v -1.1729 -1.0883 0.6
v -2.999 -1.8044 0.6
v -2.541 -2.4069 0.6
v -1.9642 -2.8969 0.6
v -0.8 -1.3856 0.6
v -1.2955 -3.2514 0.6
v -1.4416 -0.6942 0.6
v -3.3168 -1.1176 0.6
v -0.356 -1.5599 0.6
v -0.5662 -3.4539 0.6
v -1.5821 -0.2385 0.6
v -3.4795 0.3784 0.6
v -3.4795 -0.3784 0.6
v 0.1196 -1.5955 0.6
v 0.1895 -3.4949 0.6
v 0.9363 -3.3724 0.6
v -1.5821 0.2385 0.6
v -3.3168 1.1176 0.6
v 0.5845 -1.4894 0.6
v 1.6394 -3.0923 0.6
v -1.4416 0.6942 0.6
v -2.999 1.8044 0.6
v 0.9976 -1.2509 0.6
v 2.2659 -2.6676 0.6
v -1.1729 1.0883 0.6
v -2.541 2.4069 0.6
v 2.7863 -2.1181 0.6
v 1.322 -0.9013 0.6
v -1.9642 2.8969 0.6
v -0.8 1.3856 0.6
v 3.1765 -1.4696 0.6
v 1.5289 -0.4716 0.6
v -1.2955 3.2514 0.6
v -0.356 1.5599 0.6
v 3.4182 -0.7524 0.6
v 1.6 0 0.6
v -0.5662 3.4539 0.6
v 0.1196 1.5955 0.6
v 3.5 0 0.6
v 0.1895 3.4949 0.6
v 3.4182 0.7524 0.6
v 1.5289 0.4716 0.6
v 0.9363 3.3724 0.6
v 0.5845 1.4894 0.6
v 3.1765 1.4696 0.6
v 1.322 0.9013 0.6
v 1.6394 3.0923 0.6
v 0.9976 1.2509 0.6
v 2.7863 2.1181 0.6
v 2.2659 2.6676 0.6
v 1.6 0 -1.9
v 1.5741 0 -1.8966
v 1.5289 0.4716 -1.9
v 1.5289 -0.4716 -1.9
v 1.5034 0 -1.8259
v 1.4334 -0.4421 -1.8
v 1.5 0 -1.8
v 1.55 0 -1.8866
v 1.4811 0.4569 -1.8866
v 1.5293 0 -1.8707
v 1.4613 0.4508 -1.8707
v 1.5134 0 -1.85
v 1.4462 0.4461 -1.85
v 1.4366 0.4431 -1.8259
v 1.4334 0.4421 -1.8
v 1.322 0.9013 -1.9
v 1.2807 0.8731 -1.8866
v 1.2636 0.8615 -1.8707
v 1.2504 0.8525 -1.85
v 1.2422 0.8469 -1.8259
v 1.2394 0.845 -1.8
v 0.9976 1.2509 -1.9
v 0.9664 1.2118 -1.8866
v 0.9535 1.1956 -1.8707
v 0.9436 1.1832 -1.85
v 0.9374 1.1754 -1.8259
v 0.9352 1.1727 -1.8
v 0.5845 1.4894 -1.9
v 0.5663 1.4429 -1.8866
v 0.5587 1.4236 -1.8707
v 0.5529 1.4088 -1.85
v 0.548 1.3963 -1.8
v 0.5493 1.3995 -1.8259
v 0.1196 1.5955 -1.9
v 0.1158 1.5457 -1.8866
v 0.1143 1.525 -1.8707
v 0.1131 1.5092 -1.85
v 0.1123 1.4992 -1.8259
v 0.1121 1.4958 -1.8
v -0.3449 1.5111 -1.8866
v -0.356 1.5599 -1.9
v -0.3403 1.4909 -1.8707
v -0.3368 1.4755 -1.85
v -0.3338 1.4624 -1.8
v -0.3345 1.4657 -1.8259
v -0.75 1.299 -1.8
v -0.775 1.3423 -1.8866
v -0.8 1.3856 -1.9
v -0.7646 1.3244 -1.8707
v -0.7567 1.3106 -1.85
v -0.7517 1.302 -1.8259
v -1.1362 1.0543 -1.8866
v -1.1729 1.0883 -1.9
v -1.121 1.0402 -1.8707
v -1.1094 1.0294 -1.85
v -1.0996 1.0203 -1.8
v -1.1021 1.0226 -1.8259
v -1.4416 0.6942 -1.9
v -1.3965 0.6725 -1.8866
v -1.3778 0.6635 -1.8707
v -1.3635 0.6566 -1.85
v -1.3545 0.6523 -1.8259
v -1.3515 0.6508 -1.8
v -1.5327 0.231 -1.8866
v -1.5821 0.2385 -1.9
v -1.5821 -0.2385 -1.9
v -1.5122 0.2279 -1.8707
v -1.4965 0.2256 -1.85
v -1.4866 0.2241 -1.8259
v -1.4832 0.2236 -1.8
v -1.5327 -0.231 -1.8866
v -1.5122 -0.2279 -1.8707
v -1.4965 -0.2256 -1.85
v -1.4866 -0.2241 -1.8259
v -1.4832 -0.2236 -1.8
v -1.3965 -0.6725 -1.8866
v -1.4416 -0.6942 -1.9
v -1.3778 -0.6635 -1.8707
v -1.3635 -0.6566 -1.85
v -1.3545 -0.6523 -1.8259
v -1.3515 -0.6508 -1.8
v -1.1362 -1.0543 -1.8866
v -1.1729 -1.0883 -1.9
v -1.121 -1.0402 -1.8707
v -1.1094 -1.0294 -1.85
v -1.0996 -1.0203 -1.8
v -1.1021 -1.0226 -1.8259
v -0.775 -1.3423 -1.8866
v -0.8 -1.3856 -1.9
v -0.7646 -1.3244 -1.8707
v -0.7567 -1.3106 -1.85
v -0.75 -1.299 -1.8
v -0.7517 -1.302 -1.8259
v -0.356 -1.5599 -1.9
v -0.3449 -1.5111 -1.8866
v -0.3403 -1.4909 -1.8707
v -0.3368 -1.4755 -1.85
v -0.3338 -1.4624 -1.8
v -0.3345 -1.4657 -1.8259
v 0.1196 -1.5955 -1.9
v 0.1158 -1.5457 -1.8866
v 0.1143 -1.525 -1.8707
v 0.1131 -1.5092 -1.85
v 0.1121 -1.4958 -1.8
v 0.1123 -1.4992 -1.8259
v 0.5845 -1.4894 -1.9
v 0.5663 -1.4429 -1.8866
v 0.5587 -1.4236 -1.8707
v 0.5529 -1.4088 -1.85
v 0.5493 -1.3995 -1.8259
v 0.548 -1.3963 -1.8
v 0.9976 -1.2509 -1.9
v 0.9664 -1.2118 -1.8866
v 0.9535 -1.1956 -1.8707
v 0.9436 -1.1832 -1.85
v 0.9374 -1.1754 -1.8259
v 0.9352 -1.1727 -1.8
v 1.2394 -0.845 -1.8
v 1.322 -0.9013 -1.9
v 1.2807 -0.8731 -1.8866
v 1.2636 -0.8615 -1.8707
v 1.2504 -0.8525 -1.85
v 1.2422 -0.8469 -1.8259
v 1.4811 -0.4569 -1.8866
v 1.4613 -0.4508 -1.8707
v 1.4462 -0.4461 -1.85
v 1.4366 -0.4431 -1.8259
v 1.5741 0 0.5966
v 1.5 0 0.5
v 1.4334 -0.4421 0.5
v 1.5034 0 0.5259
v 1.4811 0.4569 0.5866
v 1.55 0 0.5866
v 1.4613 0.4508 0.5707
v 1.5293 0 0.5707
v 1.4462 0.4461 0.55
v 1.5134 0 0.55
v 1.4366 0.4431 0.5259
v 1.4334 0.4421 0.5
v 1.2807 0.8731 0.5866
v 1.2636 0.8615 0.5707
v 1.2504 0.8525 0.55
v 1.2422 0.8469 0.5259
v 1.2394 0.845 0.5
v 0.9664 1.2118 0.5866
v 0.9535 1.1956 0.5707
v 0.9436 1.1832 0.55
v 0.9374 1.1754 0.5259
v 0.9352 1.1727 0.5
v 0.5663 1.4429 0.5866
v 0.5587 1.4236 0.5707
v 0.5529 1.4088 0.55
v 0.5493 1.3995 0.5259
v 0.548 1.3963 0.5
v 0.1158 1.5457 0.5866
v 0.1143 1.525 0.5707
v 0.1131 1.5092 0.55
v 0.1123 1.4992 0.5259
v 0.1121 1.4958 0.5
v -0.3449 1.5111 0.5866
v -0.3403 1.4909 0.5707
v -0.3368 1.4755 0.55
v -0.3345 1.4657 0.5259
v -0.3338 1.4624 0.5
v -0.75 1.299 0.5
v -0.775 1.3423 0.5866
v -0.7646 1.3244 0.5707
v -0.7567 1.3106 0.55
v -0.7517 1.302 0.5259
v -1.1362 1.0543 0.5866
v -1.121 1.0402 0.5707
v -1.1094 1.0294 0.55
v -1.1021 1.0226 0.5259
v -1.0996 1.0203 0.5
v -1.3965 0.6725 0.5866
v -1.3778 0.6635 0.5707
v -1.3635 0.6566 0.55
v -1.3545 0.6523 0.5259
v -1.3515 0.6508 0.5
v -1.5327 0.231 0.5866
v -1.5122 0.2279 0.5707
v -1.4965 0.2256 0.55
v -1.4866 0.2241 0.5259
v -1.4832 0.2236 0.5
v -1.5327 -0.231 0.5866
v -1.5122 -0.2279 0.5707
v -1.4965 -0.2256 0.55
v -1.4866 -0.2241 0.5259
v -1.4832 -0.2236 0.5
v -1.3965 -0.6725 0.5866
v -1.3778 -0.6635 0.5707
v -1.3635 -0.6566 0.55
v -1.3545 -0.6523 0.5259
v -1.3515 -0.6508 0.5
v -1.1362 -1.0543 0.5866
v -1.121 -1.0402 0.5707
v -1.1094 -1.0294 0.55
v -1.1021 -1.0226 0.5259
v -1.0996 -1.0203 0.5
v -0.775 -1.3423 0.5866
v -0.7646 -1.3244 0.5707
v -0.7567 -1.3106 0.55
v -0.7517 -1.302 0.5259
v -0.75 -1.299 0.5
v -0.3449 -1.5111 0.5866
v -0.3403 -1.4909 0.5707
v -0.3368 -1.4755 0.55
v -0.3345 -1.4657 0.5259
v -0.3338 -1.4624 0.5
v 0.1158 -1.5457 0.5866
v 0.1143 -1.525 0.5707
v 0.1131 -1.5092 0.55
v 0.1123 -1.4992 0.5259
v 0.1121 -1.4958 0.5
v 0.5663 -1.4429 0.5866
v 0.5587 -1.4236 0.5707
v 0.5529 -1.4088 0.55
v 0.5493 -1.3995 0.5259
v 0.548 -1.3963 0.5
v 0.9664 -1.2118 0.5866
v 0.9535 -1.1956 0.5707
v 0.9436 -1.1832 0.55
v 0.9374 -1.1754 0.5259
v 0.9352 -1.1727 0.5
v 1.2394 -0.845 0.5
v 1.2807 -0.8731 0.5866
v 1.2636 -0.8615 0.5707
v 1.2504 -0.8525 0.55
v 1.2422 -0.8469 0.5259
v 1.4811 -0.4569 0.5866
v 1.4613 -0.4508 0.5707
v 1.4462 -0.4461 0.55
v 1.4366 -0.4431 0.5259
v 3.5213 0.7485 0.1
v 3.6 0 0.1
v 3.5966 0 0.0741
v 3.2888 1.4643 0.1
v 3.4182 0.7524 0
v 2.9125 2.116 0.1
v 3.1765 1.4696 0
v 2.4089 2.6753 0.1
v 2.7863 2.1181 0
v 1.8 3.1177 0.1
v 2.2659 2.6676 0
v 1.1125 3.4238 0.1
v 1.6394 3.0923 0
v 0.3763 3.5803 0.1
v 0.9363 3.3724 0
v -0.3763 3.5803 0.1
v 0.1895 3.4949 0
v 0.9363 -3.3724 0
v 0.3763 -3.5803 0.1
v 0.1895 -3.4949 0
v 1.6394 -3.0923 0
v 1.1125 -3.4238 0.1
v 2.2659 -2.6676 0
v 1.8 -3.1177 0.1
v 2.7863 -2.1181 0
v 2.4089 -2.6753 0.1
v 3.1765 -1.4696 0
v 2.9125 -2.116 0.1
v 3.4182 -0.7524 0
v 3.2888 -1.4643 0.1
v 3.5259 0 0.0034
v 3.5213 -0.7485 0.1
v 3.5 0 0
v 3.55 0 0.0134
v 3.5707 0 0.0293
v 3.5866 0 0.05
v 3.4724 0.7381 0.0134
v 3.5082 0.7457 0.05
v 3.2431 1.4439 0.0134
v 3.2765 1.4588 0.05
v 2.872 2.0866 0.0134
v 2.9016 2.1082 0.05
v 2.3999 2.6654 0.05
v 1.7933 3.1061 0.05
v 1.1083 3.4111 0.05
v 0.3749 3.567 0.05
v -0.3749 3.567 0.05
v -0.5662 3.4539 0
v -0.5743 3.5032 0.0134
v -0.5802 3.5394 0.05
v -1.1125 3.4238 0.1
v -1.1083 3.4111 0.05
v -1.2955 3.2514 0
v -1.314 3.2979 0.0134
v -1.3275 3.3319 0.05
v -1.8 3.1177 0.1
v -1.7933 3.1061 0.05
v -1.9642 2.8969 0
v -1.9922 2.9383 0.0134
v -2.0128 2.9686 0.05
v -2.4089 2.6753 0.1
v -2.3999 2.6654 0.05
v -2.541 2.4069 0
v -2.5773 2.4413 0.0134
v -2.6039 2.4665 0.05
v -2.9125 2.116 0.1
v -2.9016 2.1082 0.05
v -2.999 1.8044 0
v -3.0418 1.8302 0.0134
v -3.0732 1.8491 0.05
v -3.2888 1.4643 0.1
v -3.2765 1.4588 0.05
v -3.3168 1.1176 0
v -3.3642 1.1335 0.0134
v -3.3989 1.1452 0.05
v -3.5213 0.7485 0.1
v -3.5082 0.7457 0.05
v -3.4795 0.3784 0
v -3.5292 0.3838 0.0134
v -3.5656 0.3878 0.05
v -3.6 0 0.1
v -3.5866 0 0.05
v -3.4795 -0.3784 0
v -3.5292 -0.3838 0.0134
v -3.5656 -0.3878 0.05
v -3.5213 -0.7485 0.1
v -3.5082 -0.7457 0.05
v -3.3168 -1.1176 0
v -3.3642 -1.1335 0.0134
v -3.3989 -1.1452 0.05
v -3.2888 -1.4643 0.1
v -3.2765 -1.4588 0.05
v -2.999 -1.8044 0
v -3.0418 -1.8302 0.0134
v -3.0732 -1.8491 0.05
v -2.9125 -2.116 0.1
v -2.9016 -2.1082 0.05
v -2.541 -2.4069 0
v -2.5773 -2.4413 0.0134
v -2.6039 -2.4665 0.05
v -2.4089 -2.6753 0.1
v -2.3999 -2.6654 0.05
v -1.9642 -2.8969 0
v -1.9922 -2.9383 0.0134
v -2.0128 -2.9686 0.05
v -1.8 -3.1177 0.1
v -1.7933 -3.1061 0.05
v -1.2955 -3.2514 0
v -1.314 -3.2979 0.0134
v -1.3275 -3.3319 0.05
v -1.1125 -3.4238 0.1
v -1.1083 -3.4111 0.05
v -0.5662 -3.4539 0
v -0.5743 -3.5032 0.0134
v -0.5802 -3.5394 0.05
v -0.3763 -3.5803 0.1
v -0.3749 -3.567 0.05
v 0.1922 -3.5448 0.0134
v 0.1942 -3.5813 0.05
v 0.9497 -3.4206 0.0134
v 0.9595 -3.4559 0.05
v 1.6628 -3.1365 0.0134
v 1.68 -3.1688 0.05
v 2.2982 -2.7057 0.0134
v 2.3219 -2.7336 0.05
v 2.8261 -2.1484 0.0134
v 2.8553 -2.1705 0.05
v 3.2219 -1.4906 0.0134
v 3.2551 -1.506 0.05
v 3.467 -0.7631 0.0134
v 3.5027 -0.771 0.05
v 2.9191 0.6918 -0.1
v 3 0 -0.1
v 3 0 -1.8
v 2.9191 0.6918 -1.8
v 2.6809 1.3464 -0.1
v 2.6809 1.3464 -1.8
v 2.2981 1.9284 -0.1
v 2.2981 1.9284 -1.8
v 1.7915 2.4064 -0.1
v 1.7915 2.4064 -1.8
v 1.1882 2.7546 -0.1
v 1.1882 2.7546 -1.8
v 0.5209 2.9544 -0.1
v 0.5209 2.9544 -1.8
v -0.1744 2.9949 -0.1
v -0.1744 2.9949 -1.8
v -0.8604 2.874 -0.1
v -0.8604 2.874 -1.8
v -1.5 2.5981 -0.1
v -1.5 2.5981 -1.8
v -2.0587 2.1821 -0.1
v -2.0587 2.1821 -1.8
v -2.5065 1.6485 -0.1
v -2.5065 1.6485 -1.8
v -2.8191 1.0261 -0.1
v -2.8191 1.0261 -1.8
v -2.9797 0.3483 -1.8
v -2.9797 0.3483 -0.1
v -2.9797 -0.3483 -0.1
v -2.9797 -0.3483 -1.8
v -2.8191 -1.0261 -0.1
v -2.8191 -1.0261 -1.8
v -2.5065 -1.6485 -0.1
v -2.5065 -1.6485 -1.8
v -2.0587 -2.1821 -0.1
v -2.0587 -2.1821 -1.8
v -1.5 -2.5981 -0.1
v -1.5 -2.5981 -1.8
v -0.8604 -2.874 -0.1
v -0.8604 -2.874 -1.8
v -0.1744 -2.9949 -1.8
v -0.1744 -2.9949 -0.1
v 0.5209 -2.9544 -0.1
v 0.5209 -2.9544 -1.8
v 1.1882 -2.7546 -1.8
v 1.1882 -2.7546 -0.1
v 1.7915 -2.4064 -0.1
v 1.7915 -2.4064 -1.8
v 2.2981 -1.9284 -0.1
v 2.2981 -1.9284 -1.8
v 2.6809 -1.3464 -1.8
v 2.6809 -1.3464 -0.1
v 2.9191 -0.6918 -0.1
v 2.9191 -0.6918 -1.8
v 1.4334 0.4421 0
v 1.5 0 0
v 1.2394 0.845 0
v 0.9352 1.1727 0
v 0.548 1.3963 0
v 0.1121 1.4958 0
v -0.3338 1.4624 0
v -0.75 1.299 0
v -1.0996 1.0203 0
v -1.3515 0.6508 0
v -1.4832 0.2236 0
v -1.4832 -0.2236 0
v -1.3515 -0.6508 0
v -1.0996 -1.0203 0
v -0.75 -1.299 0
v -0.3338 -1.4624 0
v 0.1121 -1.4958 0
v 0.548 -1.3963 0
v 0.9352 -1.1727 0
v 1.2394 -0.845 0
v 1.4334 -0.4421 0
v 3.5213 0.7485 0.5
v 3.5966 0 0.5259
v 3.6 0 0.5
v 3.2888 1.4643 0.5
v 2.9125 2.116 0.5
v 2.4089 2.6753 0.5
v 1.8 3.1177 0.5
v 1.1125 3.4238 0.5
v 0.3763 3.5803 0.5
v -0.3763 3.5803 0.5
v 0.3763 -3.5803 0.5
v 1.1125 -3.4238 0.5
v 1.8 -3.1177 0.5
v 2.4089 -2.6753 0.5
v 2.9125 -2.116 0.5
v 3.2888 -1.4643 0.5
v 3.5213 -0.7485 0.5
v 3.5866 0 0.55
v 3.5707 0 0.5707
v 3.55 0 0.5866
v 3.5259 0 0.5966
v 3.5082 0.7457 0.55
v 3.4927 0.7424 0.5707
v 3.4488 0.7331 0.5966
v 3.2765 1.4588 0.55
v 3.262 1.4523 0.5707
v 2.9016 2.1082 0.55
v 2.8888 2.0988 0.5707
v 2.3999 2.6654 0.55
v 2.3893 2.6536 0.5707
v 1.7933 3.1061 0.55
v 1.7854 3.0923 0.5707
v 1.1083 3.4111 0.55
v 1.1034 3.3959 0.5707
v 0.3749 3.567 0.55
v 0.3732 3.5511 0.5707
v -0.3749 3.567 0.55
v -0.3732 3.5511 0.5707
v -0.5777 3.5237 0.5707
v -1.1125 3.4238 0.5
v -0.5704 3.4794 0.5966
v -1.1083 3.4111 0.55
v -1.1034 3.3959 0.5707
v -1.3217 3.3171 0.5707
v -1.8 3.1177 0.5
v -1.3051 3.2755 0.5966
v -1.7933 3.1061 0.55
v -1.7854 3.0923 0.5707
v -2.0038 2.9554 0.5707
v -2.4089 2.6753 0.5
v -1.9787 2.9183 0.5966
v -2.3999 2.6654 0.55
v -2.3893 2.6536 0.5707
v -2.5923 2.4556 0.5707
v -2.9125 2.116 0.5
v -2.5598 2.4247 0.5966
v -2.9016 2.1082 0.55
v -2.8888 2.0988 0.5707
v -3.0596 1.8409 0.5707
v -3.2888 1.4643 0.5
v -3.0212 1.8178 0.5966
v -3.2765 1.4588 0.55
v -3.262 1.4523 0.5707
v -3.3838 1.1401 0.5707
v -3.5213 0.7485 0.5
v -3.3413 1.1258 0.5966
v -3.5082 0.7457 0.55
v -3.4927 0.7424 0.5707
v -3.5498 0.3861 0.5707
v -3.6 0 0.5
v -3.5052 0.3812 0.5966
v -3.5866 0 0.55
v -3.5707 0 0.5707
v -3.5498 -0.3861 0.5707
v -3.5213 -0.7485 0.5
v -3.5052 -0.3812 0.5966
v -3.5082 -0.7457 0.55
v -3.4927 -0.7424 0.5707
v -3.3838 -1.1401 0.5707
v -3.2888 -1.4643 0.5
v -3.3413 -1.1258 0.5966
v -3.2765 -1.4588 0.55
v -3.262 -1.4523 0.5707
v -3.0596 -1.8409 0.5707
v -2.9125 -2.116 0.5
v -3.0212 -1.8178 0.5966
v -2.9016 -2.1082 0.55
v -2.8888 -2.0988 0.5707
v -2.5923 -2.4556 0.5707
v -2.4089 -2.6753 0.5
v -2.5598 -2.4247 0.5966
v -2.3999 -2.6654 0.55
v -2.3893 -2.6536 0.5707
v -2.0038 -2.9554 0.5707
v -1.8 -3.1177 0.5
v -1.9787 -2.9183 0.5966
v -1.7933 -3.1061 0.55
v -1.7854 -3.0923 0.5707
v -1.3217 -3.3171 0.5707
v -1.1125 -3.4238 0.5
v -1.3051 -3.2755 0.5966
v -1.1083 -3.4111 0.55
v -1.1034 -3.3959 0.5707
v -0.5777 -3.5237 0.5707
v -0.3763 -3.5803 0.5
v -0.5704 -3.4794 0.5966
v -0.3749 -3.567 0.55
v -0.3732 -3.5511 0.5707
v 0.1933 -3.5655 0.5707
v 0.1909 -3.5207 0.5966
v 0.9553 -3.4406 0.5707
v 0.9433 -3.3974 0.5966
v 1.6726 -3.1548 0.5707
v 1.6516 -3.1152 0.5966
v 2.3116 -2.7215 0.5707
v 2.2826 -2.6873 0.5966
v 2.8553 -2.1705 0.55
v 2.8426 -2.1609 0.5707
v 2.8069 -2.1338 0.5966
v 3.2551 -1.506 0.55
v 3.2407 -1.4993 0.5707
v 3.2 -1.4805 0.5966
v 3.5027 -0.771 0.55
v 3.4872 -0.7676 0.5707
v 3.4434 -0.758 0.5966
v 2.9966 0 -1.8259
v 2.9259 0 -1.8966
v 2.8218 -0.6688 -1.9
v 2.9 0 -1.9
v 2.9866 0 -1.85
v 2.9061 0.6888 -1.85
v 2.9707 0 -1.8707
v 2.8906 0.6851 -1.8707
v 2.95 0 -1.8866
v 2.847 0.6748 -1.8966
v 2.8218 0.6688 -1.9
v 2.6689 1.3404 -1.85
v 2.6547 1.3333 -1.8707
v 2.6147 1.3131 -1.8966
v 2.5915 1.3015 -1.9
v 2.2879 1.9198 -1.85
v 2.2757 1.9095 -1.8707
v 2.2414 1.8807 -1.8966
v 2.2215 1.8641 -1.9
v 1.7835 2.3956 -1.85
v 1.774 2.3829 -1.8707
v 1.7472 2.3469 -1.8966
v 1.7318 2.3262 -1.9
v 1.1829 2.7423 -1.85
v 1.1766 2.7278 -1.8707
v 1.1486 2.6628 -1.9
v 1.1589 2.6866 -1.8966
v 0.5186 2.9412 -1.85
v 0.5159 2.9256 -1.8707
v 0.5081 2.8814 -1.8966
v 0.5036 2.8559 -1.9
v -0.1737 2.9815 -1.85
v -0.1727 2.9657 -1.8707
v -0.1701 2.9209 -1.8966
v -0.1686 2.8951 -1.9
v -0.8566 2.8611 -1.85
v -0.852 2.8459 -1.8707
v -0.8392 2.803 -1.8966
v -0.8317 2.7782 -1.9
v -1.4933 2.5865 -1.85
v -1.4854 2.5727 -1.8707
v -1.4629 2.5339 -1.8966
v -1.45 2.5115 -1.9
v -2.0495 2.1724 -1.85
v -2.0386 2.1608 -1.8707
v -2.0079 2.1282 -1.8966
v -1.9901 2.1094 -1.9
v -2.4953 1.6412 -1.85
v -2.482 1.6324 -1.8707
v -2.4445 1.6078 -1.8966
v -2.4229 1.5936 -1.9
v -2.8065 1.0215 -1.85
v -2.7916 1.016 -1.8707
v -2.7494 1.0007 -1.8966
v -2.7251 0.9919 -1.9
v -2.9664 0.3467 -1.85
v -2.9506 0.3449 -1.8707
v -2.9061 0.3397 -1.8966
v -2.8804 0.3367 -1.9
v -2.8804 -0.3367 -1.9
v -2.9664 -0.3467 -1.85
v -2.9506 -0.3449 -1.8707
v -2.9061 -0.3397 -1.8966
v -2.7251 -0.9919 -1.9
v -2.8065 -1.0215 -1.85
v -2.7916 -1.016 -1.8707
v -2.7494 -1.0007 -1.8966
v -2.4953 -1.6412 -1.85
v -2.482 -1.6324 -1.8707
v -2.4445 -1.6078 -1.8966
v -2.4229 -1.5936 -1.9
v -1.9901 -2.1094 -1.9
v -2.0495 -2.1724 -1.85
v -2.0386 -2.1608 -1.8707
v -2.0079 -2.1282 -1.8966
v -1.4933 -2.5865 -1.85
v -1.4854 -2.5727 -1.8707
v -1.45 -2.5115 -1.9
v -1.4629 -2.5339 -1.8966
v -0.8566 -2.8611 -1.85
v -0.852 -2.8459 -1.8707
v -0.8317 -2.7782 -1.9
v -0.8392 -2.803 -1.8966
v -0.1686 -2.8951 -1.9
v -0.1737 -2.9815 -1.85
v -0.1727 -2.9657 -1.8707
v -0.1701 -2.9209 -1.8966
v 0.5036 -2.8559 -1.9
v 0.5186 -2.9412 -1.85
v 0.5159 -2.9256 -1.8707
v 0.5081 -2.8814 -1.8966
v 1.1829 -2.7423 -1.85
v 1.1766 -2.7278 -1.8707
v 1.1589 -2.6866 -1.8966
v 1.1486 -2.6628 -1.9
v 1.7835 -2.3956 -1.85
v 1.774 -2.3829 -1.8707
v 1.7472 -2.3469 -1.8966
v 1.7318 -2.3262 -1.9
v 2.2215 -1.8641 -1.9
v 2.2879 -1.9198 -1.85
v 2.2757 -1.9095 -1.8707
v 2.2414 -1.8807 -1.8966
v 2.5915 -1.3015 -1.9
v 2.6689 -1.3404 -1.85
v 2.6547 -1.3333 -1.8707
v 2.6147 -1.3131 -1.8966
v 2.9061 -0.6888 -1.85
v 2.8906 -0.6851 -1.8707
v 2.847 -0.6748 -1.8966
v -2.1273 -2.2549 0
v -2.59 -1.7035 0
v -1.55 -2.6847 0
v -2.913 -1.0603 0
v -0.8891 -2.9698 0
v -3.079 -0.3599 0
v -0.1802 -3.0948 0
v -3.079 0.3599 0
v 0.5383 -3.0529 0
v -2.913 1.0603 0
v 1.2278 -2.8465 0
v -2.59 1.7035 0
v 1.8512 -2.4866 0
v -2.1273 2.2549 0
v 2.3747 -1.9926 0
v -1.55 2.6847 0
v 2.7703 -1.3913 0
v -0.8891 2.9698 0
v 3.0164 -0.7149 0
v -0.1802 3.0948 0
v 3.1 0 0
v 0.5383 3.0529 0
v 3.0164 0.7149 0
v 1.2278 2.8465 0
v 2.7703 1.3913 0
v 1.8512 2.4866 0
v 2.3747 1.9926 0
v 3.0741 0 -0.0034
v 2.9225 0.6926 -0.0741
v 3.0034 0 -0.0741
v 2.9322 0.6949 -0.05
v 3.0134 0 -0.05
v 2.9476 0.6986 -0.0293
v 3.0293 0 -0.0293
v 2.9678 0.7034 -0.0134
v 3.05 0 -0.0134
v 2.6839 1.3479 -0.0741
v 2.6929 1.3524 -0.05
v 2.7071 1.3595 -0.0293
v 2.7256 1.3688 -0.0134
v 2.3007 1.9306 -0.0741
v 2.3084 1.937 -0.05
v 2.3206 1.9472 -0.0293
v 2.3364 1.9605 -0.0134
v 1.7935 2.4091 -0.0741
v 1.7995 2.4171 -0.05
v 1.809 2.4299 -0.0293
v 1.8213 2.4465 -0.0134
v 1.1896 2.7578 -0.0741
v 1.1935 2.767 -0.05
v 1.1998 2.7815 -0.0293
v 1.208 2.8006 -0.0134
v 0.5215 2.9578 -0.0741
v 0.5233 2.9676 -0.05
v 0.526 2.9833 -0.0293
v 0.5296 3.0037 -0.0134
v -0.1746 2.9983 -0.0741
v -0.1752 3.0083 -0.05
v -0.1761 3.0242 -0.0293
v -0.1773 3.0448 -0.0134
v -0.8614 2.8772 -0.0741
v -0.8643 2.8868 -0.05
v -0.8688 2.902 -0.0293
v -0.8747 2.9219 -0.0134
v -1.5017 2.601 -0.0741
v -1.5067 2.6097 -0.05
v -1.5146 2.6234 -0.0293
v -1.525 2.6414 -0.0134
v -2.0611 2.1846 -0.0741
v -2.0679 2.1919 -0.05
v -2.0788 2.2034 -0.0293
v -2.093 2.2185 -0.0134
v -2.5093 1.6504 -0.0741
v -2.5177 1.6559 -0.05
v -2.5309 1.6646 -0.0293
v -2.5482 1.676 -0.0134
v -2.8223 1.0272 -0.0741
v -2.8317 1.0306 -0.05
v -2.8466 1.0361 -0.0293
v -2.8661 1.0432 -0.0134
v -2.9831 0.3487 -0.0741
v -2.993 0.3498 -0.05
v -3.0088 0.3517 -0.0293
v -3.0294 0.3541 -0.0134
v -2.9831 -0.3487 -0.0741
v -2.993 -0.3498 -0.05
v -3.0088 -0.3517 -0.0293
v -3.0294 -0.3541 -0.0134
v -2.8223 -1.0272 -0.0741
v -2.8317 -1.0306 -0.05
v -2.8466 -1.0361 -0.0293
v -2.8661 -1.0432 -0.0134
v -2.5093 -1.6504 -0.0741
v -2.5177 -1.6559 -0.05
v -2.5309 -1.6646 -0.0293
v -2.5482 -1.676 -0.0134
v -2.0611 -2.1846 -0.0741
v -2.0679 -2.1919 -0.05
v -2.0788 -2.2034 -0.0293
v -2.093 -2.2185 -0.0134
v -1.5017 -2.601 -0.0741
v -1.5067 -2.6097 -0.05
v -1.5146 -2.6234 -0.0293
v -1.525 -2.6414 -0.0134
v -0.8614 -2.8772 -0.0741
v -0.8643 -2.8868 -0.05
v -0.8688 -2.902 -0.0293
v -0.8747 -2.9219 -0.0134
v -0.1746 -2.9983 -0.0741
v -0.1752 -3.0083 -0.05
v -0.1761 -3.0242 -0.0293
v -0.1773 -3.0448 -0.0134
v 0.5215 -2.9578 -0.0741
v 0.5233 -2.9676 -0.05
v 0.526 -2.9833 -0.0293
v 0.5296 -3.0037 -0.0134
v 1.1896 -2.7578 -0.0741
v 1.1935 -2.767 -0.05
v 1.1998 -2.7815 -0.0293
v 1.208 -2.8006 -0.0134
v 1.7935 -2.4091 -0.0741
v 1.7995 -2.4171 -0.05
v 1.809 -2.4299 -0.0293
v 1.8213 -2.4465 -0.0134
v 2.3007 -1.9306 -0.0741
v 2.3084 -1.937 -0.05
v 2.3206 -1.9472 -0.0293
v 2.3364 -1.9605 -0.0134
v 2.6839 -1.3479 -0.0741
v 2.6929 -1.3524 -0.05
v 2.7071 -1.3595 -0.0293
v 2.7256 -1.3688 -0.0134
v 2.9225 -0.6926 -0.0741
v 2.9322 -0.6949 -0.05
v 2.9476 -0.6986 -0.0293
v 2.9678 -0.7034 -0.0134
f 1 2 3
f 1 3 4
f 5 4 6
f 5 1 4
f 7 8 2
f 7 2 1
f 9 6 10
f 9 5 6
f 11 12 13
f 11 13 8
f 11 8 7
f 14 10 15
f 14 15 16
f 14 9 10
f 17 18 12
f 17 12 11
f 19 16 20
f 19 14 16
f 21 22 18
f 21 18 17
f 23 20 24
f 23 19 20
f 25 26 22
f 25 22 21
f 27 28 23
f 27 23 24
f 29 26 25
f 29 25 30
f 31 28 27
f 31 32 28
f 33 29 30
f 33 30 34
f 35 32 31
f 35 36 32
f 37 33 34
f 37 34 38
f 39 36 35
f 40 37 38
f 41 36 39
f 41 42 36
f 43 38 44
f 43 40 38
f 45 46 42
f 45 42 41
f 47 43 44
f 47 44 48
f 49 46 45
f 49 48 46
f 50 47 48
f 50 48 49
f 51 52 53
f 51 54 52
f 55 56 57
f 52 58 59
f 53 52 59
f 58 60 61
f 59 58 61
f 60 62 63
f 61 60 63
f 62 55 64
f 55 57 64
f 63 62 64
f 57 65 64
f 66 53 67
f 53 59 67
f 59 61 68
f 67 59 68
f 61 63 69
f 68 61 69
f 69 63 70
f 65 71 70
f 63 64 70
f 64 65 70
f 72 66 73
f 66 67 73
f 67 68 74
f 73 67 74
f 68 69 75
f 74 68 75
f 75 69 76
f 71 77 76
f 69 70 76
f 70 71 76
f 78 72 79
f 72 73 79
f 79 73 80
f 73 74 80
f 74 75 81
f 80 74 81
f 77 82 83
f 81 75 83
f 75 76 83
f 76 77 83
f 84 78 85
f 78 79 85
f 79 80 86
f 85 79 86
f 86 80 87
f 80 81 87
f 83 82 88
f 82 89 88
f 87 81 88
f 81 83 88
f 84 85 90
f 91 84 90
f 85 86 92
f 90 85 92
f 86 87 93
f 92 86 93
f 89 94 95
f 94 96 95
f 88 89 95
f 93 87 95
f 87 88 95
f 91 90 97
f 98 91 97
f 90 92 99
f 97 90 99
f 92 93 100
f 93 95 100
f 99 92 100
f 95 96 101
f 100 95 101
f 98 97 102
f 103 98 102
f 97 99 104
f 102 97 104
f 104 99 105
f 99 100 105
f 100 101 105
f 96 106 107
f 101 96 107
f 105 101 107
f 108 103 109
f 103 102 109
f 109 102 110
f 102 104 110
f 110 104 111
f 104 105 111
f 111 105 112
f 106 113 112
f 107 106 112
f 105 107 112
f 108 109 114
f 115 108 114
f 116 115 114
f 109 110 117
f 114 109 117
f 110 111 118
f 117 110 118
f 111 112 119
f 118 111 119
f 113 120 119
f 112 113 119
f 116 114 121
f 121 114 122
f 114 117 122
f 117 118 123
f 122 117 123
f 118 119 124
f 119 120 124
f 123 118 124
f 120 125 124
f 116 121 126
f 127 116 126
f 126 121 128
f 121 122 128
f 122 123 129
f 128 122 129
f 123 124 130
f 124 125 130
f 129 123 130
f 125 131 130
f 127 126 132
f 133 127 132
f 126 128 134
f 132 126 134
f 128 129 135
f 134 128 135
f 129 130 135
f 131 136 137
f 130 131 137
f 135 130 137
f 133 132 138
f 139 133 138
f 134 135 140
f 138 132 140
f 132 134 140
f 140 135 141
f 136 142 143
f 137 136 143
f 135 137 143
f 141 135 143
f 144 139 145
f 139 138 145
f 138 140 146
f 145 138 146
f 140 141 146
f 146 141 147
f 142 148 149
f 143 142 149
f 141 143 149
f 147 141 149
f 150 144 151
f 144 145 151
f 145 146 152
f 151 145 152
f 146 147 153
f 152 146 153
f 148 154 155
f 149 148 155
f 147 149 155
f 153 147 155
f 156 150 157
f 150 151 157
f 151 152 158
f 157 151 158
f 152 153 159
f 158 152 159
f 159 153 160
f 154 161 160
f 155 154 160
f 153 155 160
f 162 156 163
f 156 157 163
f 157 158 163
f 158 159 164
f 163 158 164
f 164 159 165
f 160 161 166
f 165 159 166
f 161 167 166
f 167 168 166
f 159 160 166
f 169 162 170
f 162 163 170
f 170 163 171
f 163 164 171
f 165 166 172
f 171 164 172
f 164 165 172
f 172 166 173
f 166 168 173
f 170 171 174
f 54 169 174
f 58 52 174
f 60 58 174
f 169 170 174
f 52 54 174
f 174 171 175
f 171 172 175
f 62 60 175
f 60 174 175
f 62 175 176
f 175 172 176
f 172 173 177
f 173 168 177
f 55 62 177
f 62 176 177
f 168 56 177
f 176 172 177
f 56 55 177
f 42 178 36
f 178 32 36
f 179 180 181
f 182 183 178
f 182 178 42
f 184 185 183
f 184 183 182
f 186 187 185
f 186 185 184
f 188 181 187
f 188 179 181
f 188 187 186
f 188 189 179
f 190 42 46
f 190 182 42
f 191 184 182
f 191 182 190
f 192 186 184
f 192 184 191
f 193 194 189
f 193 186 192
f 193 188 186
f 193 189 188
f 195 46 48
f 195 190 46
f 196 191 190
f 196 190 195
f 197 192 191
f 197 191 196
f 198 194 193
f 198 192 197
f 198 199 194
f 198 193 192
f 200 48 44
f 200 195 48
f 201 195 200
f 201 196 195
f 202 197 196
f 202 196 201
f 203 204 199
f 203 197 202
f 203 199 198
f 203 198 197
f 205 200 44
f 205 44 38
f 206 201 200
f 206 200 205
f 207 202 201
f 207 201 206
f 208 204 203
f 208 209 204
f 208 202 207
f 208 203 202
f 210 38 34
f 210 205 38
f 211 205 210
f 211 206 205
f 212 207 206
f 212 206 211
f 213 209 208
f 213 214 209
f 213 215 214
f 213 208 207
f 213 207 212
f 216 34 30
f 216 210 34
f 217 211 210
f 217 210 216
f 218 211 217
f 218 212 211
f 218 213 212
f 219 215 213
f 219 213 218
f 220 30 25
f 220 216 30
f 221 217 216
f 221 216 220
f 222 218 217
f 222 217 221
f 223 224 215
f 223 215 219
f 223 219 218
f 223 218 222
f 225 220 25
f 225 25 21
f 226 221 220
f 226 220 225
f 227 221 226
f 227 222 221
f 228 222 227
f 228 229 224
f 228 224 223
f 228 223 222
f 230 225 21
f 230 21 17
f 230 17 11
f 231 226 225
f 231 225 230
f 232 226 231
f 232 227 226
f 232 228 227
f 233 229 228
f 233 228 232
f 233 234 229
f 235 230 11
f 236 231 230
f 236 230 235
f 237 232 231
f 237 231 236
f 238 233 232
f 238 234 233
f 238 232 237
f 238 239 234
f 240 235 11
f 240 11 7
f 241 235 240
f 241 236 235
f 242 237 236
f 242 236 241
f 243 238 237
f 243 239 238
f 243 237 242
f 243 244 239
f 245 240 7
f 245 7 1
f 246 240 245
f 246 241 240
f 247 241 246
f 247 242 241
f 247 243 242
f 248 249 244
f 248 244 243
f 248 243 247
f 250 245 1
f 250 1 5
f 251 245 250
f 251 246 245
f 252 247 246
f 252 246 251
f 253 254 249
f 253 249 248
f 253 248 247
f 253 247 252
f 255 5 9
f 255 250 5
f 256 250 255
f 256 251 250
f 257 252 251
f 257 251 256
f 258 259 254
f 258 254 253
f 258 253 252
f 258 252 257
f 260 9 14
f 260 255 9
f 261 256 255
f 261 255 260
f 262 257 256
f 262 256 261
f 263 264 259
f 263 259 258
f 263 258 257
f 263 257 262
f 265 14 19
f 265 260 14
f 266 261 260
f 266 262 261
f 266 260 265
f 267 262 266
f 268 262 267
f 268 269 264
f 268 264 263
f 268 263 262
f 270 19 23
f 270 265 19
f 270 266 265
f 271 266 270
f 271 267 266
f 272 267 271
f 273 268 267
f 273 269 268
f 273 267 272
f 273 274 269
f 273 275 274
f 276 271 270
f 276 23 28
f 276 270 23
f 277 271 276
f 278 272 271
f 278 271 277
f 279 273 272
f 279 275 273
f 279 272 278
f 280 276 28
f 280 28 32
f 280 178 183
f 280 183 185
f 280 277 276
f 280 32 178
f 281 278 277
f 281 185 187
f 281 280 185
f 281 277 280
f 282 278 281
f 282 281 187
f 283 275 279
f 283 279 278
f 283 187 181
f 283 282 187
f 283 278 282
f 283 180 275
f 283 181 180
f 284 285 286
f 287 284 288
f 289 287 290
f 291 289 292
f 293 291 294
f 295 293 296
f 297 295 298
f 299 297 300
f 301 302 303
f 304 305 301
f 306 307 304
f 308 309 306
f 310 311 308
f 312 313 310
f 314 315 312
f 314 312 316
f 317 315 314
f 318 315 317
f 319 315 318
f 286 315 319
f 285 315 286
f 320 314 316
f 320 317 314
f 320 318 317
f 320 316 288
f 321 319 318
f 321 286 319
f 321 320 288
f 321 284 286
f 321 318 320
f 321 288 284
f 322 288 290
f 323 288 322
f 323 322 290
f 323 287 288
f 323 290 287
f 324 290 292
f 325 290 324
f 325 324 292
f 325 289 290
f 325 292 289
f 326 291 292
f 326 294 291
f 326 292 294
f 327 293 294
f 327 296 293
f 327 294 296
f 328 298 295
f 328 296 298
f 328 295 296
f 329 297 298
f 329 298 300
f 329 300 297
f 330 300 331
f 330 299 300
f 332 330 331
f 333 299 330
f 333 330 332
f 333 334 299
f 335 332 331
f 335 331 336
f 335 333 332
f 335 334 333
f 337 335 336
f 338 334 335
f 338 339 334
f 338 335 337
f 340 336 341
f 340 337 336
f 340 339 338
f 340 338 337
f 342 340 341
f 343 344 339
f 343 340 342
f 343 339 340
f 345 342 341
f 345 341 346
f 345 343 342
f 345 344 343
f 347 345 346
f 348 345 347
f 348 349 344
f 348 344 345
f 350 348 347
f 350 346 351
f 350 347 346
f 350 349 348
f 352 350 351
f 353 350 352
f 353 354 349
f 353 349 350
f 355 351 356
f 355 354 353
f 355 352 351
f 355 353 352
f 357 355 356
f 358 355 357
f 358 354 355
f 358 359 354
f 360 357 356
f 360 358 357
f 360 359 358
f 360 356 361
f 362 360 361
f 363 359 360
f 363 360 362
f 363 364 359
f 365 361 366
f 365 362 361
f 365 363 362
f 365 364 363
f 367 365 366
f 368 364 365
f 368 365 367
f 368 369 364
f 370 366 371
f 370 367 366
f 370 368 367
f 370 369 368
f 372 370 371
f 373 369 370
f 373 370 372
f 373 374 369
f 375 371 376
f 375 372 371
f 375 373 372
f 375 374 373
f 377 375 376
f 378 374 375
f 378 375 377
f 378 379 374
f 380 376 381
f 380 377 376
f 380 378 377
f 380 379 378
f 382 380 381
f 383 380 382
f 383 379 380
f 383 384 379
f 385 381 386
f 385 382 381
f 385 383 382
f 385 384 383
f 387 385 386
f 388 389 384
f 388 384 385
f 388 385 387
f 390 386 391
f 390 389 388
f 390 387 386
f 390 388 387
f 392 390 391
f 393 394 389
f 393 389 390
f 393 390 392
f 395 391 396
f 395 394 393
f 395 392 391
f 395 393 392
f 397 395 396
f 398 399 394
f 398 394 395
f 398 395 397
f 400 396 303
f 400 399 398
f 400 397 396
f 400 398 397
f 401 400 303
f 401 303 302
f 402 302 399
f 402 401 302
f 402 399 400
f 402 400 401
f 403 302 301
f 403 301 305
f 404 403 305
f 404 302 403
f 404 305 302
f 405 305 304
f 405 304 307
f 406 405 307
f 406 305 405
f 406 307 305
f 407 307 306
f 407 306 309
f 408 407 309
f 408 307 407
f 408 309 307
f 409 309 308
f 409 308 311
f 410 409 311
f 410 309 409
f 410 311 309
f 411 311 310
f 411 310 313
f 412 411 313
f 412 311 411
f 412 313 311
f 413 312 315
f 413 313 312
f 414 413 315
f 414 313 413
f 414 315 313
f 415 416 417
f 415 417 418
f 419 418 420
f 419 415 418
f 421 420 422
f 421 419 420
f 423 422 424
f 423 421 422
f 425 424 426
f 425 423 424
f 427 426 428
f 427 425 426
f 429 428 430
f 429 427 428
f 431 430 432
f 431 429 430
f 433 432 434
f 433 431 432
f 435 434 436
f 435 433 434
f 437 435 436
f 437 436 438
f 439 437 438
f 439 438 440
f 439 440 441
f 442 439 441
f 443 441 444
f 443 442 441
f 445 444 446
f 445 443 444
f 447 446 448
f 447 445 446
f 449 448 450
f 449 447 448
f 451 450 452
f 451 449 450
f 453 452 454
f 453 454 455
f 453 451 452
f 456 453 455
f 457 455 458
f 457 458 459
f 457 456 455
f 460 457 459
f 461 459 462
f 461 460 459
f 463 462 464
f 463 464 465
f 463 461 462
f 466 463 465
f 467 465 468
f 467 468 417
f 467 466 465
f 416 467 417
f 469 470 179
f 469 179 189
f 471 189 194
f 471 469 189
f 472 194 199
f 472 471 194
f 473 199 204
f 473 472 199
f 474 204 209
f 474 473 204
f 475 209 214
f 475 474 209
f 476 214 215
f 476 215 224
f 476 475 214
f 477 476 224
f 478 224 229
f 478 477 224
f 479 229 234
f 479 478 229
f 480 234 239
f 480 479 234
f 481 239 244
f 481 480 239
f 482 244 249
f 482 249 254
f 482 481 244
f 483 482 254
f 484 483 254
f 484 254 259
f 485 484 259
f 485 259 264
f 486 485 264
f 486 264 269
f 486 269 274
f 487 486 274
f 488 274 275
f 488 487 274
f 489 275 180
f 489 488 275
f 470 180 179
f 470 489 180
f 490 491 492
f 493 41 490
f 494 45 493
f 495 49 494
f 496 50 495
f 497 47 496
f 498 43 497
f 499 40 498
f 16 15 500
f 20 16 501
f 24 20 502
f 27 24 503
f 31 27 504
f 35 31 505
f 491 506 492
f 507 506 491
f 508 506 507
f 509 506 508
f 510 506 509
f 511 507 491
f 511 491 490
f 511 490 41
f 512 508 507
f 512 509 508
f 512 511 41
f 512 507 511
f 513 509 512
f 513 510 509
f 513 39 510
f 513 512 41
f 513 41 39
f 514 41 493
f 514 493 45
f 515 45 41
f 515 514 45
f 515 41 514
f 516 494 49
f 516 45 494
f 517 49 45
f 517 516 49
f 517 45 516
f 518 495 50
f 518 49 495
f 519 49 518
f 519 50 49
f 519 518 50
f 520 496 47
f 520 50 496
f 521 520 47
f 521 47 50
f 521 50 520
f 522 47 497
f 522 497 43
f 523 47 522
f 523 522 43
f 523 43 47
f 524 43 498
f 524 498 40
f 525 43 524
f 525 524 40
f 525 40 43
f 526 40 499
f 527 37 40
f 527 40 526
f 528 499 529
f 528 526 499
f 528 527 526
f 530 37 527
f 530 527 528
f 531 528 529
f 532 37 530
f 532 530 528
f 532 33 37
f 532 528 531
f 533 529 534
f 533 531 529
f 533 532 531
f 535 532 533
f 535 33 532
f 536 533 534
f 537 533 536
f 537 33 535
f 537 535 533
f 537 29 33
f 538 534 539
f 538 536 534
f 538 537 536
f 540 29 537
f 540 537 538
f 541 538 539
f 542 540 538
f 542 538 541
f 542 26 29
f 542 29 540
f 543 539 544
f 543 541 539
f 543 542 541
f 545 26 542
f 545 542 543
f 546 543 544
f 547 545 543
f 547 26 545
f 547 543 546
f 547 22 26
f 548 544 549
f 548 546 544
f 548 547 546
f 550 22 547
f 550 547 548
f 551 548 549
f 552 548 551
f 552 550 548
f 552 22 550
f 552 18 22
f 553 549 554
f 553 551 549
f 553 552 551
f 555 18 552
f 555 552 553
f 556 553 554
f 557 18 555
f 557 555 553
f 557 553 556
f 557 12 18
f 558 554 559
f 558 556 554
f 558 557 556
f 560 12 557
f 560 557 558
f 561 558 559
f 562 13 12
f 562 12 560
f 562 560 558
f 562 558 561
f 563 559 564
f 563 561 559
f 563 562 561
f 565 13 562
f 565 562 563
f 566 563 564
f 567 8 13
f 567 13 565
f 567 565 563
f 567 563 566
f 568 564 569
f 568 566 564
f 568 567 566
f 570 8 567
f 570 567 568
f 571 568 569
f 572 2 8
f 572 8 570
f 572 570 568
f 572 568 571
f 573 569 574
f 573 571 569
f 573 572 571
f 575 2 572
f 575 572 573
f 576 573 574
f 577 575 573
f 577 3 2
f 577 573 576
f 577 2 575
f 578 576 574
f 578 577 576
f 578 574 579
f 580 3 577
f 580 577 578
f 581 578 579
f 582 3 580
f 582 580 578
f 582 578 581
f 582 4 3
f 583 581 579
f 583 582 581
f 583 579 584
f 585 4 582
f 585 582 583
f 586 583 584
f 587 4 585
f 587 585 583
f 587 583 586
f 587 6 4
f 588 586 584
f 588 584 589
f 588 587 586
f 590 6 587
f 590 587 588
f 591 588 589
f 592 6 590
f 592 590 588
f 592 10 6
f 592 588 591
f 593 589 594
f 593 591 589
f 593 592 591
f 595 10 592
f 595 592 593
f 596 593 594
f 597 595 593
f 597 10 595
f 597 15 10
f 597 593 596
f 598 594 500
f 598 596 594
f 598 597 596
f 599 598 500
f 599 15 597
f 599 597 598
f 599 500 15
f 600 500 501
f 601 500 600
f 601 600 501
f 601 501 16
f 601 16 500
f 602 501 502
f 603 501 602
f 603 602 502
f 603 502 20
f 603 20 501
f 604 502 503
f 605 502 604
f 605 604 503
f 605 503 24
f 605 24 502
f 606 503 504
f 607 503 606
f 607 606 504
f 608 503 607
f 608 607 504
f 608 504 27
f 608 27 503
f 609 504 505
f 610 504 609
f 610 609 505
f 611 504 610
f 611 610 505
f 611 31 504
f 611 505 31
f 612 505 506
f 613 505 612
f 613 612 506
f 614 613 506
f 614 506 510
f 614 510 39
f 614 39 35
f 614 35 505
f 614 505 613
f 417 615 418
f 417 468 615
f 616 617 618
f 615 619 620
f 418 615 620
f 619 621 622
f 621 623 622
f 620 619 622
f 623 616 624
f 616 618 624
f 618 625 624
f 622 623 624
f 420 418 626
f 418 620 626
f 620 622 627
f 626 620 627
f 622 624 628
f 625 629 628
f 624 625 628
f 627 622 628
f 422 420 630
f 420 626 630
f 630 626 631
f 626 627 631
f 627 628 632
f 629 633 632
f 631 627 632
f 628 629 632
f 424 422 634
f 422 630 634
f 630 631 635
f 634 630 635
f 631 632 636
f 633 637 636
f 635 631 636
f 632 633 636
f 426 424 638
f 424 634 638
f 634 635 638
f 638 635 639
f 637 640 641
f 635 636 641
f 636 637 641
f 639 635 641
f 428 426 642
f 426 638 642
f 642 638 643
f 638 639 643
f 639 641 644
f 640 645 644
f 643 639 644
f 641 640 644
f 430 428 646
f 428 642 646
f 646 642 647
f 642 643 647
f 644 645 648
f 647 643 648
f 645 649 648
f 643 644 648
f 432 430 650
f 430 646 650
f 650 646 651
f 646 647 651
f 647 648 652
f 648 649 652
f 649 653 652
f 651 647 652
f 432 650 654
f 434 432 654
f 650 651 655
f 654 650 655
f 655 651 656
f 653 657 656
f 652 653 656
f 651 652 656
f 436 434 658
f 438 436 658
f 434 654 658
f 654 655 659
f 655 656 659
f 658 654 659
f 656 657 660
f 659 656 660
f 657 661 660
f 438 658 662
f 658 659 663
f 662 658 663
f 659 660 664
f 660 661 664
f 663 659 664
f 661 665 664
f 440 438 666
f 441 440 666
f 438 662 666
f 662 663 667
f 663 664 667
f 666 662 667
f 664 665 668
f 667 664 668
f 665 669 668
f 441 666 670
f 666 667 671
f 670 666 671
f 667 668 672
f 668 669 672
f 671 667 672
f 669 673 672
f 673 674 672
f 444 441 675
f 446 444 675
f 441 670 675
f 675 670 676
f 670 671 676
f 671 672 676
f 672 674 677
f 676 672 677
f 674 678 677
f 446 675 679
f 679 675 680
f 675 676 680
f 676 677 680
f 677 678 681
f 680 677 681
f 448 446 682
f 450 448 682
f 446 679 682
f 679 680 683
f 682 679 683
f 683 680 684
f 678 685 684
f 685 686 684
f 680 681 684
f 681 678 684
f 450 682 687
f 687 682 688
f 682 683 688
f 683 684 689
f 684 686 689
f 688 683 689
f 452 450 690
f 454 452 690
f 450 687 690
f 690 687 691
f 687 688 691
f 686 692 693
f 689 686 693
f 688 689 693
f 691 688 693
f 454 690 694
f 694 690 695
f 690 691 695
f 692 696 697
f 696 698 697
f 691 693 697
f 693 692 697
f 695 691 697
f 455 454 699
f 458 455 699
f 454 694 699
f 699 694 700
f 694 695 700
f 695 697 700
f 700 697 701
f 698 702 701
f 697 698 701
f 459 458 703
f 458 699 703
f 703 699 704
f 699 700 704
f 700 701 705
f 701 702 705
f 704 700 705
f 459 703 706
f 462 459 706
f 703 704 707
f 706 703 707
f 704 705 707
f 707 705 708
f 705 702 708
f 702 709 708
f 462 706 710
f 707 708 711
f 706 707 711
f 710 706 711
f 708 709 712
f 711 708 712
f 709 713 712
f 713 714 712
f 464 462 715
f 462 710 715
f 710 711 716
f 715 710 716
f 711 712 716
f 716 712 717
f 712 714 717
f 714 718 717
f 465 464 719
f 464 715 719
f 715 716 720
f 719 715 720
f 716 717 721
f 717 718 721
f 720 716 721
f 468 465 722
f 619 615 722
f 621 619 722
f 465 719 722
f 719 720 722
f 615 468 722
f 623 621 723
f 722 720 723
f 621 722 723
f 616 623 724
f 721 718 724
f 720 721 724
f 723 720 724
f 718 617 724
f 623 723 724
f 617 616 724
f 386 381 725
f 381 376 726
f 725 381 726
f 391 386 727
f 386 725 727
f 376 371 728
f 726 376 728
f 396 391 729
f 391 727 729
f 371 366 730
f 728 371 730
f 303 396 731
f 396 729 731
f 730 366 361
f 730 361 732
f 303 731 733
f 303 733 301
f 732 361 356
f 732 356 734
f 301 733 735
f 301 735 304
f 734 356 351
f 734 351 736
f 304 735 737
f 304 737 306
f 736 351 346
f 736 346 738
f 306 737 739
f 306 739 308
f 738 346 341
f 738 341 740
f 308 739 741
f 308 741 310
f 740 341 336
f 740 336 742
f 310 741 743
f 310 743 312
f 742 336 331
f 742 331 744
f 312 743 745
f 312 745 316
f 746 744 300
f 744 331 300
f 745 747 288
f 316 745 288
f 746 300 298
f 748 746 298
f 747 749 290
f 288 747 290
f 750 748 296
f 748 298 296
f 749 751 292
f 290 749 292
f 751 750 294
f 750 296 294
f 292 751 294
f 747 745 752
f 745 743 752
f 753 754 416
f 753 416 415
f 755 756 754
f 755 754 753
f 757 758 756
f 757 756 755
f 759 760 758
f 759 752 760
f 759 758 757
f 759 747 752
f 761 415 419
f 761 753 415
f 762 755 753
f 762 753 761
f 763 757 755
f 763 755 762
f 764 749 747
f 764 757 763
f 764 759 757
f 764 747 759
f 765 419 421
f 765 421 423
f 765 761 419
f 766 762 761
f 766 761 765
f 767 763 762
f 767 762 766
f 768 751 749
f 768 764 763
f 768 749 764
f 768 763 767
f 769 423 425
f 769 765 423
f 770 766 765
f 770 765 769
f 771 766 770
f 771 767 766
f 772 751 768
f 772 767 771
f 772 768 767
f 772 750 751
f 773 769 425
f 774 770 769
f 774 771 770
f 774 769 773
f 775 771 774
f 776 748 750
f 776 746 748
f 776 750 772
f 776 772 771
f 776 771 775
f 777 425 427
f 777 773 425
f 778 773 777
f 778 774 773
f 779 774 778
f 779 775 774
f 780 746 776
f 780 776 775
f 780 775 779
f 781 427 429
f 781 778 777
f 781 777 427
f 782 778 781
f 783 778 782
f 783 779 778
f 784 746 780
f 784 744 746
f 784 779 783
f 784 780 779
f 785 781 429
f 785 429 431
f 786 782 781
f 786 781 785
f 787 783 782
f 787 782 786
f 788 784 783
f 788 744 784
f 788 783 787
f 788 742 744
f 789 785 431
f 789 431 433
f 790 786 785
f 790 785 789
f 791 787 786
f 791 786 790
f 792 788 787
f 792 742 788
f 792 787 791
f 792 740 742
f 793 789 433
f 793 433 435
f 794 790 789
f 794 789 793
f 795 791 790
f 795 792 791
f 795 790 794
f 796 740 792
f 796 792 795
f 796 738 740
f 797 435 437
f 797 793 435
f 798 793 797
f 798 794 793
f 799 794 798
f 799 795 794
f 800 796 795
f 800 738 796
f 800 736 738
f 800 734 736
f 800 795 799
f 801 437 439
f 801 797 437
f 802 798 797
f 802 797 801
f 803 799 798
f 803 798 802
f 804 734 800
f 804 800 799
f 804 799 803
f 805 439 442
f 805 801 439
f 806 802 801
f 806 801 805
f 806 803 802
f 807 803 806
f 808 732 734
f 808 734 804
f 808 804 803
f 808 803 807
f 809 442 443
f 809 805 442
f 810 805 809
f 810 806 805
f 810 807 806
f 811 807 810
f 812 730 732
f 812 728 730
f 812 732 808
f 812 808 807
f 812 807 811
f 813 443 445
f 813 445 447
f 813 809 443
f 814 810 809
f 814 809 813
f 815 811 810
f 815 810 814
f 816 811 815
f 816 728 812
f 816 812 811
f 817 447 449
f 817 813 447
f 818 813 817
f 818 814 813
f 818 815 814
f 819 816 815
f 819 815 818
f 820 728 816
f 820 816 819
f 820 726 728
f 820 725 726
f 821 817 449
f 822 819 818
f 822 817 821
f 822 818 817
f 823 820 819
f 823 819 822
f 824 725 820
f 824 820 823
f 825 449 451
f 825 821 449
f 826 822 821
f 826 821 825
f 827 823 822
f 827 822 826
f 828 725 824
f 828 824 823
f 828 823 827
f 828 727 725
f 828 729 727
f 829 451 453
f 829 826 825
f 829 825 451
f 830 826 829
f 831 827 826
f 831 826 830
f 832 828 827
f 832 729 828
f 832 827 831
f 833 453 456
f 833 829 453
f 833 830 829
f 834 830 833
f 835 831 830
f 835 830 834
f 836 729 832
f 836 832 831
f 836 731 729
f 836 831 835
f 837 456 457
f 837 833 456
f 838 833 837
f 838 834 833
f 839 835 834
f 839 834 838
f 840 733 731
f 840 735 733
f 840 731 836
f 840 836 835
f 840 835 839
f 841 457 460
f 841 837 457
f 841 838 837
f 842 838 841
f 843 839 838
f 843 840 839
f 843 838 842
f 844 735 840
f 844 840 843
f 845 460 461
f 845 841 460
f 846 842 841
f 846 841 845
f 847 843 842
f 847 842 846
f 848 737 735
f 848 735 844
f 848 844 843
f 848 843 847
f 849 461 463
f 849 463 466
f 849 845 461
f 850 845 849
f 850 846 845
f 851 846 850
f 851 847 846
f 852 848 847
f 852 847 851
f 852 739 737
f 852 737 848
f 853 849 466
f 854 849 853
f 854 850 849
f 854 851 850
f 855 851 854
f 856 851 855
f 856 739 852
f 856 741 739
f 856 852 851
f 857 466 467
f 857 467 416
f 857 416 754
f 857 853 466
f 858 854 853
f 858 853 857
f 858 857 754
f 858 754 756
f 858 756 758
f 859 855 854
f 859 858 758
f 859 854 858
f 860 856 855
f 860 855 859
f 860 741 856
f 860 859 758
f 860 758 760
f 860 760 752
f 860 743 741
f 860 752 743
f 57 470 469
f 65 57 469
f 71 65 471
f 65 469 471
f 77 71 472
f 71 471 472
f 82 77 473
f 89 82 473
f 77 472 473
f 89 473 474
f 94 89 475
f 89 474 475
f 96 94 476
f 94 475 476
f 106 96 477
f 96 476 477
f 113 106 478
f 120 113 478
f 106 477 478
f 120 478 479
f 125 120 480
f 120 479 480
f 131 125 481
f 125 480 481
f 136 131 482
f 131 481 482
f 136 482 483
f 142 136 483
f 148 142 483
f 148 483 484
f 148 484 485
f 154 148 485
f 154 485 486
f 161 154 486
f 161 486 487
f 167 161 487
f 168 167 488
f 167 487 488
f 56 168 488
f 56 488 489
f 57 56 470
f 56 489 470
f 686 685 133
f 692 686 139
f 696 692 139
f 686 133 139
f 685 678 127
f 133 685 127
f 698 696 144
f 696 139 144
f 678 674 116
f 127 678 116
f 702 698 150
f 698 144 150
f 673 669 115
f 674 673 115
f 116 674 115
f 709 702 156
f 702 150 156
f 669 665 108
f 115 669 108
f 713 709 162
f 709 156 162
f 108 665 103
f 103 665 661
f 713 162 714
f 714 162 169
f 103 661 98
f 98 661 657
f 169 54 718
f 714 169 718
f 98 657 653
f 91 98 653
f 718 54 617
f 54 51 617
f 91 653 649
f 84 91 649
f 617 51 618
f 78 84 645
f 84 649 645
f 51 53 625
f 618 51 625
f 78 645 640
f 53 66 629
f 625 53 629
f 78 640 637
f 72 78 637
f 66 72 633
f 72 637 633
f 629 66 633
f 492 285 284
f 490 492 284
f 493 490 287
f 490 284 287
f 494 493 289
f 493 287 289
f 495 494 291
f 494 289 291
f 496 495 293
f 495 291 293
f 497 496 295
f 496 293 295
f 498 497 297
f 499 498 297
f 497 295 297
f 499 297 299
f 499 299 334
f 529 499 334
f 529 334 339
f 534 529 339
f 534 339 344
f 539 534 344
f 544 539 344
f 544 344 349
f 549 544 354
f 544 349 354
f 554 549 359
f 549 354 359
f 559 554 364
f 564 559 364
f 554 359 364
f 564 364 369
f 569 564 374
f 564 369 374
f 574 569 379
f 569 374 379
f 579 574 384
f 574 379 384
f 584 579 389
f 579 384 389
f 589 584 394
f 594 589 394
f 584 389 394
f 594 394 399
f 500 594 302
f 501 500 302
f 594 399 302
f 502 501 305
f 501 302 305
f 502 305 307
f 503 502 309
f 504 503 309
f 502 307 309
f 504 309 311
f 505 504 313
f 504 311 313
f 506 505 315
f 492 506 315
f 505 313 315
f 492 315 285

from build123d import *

# Parameters (mm, degrees)
F0_R     = 3.6
F0_R_2   = 3
F0_R_3   = 1.5
F1_DEPTH = 0.6
F2_DEPTH = 1.9
F3_R     = 0.1


with BuildPart() as f1:
    # F0 (on Top) → F1 (new body)
    with BuildSketch(Plane.XY):
        Circle(F0_R)
        Circle(F0_R_2, mode=Mode.SUBTRACT)
        Circle(F0_R_2)
        Circle(F0_R_3, mode=Mode.SUBTRACT)
    extrude(amount=F1_DEPTH)

    # F0 (on Top) → F2 (join)
    with BuildSketch(Plane.XY):
        Circle(F0_R_2)
        Circle(F0_R_3, mode=Mode.SUBTRACT)
    extrude(amount=-F2_DEPTH)

    # F3
    f3_edges = [f1.edges().sort_by_distance(p)[0] for p in [
        (-3, 0, -1.9),
        (-1.5, 0, -1.9),
        (-3, 0, 0),
        (-3.6, 0, 0),
        (-3.6, 0, 0.6),
        (-1.5, 0, 0.6),
    ]]
    fillet(f3_edges, radius=F3_R)


solid = f1.part
